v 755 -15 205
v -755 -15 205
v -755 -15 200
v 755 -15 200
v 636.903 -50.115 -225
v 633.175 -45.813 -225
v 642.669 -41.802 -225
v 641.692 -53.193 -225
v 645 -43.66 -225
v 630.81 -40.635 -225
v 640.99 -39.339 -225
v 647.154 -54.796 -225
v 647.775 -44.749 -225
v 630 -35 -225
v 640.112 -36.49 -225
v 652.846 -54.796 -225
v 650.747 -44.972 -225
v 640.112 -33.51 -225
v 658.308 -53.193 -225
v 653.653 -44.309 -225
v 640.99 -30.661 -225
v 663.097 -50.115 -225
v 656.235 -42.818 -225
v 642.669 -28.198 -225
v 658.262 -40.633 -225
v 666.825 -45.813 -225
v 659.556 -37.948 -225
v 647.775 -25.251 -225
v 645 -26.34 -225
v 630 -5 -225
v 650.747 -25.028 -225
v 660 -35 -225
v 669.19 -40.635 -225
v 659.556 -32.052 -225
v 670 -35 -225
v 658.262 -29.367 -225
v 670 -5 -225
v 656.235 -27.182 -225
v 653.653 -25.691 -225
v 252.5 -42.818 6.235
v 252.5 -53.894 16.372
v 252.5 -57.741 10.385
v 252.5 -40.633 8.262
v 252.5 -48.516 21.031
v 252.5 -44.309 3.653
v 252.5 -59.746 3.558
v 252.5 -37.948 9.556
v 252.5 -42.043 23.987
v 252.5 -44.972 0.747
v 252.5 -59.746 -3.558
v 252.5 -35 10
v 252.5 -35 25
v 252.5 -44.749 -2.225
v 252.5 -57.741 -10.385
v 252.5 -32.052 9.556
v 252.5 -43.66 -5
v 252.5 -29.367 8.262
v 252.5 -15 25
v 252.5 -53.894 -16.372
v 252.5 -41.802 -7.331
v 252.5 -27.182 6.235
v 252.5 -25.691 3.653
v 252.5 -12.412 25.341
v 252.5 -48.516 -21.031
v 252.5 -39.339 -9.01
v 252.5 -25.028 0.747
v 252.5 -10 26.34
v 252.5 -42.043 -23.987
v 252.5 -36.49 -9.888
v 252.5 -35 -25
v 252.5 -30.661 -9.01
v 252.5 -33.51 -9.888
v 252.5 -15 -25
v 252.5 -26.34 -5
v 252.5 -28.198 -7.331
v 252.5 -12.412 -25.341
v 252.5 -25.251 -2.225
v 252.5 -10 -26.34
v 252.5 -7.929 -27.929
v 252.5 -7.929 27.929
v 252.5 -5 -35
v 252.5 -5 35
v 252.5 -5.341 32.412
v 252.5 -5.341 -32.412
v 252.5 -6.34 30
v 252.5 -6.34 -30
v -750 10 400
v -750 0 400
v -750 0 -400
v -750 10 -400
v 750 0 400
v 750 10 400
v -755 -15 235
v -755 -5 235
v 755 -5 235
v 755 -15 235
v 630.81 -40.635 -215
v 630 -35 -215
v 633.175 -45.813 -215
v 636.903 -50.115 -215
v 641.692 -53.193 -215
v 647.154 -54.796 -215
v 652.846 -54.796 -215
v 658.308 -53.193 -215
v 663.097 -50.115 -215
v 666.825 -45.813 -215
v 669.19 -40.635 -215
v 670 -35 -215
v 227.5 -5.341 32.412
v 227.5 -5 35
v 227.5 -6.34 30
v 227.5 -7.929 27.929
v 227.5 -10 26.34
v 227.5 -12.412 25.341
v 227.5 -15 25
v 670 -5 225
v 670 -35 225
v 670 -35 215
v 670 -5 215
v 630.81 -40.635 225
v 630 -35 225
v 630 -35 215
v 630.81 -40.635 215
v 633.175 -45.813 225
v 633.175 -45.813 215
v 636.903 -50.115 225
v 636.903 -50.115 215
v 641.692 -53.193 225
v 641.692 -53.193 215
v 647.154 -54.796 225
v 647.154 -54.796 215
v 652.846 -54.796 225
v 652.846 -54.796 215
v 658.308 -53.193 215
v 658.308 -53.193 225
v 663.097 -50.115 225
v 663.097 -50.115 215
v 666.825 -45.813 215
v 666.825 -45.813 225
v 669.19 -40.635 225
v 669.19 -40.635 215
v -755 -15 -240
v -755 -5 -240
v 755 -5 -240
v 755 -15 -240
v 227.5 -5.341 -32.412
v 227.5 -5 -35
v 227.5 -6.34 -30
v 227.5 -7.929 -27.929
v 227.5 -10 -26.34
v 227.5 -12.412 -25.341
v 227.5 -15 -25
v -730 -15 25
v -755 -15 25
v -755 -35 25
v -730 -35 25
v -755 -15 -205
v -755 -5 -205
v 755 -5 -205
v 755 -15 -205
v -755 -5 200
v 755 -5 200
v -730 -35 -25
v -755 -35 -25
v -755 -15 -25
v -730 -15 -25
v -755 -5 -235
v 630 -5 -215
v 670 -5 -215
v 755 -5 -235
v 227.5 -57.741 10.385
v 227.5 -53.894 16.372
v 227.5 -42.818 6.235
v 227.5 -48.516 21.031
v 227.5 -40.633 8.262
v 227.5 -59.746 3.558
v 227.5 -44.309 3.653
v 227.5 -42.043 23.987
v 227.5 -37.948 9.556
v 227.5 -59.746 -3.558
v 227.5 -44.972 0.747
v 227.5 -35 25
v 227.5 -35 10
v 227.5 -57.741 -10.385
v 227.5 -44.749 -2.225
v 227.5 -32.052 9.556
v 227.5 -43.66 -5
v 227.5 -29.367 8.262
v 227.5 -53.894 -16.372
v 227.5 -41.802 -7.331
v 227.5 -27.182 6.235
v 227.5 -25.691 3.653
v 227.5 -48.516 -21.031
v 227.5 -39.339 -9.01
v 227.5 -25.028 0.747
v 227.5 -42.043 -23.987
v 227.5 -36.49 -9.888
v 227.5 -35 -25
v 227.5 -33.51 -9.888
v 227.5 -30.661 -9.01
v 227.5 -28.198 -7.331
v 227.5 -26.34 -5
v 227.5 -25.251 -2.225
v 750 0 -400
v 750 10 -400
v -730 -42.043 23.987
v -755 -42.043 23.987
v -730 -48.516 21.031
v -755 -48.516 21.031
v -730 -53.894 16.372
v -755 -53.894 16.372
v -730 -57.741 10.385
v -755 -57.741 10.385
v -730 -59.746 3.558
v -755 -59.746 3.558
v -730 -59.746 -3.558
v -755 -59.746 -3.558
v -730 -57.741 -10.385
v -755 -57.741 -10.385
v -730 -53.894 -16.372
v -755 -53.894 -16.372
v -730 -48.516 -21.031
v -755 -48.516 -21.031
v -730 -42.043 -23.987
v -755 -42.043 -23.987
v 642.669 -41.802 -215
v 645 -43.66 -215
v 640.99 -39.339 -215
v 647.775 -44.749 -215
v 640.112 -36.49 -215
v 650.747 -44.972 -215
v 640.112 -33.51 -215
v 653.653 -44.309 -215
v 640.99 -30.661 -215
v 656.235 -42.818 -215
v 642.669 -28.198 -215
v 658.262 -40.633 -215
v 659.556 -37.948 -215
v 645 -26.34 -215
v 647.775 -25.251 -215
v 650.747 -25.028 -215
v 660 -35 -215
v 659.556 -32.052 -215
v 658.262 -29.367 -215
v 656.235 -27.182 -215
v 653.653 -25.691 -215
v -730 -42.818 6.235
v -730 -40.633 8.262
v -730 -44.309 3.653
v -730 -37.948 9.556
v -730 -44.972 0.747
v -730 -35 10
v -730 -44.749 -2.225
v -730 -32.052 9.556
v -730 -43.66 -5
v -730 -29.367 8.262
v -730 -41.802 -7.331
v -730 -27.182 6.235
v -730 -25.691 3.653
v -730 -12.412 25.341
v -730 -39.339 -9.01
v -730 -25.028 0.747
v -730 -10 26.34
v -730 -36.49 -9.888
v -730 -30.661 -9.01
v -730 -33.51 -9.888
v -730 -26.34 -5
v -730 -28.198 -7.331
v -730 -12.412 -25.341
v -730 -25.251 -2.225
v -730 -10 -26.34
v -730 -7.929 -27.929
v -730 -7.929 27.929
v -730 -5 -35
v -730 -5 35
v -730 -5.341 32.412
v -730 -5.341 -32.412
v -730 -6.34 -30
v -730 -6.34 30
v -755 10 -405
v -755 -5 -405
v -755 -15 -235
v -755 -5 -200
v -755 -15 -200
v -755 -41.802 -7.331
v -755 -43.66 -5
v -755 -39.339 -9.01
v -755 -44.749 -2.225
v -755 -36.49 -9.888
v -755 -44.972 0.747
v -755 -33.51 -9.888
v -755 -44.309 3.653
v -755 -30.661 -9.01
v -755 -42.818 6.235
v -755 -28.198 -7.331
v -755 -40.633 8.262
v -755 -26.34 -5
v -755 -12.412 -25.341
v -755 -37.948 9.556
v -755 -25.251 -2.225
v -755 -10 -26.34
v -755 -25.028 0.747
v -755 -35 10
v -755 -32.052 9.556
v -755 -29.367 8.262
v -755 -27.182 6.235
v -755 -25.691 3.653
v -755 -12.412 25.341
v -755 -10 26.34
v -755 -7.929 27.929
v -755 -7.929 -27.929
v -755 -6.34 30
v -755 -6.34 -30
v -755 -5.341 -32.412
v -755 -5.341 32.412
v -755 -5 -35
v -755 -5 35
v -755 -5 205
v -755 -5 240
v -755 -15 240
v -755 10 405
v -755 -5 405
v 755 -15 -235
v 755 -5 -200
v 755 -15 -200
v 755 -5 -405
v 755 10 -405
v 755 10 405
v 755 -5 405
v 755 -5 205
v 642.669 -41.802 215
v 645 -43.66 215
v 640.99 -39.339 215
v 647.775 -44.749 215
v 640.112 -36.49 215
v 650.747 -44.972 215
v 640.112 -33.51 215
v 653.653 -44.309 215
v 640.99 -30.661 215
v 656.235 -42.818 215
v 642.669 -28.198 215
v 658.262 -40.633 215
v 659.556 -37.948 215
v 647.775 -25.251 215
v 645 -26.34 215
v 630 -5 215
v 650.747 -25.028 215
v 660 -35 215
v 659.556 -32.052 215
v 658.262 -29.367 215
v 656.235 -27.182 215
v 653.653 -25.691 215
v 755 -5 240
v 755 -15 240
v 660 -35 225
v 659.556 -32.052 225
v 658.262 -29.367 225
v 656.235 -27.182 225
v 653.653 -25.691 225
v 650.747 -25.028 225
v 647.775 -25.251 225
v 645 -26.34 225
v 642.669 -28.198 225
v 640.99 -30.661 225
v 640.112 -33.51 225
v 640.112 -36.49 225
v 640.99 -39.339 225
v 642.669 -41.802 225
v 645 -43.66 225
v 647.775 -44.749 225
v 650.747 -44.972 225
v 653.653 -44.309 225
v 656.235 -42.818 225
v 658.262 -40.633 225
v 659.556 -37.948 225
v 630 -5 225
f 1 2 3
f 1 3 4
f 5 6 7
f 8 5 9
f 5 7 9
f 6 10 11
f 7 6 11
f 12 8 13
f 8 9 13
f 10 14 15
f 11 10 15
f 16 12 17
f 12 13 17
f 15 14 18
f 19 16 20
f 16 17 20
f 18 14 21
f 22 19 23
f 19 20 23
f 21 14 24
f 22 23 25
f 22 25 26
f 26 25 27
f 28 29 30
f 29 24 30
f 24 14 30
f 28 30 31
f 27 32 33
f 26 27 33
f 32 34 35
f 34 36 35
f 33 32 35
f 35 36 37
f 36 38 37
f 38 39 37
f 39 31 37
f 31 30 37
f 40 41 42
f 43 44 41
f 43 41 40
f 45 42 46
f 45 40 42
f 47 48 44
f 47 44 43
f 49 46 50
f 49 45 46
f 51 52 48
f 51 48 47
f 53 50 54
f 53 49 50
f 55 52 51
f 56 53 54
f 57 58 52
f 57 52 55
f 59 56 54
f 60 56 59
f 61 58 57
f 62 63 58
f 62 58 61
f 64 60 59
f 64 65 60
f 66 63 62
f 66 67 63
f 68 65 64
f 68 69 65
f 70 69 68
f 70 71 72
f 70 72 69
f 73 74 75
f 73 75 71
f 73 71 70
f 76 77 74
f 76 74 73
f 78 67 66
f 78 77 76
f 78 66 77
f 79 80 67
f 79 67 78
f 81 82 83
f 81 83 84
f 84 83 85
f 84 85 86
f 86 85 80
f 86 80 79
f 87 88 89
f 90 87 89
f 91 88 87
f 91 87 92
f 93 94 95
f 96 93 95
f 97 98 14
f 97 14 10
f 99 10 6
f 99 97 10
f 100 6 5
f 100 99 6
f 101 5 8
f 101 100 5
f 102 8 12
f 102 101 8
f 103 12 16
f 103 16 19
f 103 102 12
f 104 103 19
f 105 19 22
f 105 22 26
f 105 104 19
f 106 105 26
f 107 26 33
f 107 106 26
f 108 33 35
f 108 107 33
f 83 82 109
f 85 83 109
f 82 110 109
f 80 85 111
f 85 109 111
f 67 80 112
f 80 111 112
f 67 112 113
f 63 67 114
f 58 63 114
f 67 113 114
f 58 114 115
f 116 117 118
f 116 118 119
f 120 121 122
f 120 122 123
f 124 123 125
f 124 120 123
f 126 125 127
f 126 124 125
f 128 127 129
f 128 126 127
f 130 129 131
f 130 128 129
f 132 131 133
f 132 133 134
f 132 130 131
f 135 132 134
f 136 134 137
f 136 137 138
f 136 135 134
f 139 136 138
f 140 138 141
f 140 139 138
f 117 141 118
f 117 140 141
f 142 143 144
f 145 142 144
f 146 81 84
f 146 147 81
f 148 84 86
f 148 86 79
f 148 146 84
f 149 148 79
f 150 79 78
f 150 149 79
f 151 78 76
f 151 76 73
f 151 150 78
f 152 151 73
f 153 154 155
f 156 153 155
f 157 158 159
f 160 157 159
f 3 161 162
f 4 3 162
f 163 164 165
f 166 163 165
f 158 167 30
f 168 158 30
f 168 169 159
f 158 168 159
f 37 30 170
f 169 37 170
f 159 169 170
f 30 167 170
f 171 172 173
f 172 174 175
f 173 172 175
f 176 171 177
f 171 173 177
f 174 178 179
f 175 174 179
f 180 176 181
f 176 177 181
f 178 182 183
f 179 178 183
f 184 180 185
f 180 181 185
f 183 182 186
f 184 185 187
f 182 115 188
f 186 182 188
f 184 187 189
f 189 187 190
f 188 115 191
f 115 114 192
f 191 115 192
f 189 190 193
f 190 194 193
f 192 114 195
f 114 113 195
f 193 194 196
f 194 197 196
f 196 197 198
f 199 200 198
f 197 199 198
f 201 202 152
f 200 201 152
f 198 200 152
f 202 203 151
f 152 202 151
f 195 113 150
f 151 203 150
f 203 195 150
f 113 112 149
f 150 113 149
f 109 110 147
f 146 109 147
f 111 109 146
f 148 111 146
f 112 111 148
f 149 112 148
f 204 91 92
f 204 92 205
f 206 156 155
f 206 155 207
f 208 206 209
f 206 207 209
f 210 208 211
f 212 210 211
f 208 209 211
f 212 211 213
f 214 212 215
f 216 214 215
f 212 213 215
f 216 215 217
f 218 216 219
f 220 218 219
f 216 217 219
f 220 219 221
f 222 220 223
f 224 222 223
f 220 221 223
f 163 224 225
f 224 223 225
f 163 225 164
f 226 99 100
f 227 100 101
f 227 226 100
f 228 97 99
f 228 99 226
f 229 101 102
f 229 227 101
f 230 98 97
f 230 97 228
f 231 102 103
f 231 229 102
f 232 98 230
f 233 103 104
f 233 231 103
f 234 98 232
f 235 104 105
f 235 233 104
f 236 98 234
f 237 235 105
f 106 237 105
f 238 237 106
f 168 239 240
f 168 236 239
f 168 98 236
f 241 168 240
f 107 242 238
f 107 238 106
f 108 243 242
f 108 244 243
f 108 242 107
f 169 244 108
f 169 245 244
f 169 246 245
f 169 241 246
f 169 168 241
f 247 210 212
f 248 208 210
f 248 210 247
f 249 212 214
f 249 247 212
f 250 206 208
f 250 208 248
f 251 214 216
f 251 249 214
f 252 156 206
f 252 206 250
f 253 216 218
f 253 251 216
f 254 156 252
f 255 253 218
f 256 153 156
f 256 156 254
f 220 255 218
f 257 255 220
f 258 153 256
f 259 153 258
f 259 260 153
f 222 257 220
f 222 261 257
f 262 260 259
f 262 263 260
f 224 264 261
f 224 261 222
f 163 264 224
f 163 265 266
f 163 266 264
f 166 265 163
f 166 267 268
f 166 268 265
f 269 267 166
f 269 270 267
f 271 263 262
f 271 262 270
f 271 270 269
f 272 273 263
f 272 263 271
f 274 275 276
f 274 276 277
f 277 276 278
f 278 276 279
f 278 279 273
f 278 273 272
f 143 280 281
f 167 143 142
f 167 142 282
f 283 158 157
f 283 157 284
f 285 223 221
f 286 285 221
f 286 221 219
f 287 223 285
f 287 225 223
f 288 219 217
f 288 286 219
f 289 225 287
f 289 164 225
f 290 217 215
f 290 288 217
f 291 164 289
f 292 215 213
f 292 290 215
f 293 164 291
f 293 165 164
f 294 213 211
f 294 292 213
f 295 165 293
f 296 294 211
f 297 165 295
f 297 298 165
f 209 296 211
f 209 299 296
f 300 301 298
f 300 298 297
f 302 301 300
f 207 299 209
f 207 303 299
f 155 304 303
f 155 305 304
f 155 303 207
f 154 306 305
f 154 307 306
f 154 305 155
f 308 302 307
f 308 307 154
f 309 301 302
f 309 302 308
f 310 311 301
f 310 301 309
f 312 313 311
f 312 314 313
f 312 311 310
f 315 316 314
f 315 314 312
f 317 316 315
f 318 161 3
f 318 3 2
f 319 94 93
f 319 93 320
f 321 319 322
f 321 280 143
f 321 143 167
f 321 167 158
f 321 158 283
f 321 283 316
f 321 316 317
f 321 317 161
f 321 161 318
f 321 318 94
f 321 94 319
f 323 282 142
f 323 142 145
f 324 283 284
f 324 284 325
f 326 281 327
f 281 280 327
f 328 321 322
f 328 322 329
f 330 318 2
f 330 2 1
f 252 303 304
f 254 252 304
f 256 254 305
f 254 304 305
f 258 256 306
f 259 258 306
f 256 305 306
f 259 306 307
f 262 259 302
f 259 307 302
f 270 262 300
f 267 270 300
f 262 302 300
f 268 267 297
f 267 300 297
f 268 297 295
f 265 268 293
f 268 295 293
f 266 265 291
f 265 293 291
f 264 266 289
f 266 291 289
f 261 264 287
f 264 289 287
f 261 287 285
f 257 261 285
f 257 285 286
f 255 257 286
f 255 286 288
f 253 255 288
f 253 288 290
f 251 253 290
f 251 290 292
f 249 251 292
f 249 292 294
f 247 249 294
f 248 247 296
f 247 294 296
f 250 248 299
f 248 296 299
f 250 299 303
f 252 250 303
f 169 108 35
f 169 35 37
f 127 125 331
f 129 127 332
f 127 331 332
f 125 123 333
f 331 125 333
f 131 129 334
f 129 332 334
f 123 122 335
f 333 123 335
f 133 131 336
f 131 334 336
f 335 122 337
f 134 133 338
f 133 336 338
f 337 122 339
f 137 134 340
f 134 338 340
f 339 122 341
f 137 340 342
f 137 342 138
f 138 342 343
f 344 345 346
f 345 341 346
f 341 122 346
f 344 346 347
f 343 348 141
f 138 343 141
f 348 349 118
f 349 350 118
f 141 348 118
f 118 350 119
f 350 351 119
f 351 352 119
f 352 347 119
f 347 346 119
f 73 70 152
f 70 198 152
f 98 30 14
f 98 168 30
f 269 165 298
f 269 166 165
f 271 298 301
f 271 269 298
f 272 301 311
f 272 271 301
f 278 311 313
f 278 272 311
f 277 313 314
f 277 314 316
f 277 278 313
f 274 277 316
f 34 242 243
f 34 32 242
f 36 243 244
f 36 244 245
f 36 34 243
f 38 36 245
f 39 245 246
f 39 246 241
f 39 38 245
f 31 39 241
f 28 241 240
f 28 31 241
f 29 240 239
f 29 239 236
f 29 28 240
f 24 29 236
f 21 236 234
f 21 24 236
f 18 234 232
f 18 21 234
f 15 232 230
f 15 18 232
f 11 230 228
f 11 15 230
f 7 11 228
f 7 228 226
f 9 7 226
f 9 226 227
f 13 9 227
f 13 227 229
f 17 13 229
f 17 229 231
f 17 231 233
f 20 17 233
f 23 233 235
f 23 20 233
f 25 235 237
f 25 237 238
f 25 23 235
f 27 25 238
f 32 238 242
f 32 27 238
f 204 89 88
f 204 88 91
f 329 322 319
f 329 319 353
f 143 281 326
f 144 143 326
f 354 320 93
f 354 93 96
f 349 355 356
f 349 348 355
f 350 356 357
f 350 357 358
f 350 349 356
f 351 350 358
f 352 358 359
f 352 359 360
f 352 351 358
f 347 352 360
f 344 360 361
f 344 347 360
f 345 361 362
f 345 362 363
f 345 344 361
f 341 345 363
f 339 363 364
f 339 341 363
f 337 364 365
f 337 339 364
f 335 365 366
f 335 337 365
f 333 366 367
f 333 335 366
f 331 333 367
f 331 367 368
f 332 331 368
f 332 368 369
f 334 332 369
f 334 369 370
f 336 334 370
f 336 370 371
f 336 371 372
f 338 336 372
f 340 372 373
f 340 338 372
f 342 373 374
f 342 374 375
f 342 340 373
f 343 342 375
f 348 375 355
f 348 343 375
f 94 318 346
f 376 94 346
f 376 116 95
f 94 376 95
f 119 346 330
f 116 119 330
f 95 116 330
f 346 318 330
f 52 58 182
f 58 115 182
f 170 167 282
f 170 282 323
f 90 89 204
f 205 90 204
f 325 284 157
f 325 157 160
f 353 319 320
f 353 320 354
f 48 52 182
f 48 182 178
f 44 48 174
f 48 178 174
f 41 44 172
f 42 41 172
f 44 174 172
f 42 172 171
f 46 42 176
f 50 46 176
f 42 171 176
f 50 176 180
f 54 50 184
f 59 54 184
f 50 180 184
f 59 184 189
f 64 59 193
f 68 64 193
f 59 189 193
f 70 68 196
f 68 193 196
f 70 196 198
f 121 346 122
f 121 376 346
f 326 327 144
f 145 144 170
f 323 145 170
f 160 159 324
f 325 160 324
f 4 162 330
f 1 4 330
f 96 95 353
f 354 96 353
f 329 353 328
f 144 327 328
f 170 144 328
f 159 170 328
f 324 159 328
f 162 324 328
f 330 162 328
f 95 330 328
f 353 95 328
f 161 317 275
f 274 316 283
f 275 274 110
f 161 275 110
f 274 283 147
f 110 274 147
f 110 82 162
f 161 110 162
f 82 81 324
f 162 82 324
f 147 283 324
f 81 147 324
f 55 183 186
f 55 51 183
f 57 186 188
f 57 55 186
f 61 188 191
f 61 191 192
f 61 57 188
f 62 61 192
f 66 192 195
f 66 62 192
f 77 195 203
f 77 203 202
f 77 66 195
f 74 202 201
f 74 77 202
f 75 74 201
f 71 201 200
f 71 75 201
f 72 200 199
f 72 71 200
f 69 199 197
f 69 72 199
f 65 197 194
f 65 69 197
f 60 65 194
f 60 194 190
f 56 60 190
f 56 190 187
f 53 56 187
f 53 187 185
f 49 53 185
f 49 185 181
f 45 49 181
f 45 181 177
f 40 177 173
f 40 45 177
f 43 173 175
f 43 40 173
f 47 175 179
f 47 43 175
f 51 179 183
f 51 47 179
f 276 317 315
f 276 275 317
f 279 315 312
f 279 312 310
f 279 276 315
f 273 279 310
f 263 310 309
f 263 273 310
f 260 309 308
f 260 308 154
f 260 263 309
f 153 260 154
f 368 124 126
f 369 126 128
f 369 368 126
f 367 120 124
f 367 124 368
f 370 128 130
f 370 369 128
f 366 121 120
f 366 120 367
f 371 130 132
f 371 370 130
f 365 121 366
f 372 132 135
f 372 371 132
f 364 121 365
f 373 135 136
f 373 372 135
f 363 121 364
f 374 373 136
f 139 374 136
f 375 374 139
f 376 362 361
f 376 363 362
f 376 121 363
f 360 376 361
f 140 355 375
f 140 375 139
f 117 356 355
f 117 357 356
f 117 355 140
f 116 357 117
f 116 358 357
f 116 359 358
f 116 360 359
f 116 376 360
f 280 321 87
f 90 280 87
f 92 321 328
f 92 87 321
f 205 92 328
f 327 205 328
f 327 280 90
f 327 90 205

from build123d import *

# Parameters (mm, degrees)
SKETCH2_W                 = 1510
SKETCH2_H                 = 810
SKETCH2_W_2               = 1500
SKETCH2_H_2               = 800
BOSS_EXTRUDE1_DEPTH       = 10
SKETCH3_W                 = 1510
SKETCH3_H                 = 810
SKETCH3_W_2               = 1460
SKETCH3_H_2               = 140
SKETCH3_W_3               = 30
SKETCH3_H_3               = 400
SKETCH3_W_4               = 1200
BOSS_EXTRUDE2_DEPTH       = 5
SKETCH5_W                 = 1510
SKETCH5_H                 = 5
BOSS_EXTRUDE3_DEPTH       = 10
LPATTERN1_COUNT           = 2
LPATTERN1_PITCH           = 35
LPATTERN2_COUNT           = 2
LPATTERN2_PITCH           = 440
LPATTERN2_COPY_1_SKETCH_W = 1510
LPATTERN2_COPY_1_SKETCH_H = 5
LPATTERN2_COPY_1_DEPTH    = 10
SKETCH6_R                 = 10
BOSS_EXTRUDE4_DEPTH       = 5
LPATTERN3_COUNT           = 2
LPATTERN3_PITCH           = 440
SKETCH8_R                 = 10
BOSS_EXTRUDE5_DEPTH       = 25
SKETCH9_W                 = 80
SKETCH9_H                 = 400
BOSS_EXTRUDE6_DEPTH       = 5
SKETCH10_R                = 10
BOSS_EXTRUDE7_DEPTH       = 12.5
SKETCH12_W                = 400
SKETCH12_H                = 5
BOSS_EXTRUDE8_DEPTH       = 100
FILLET3_R                 = 10
FILLET4_R                 = 10
FILLET5_R                 = 10
FILLET6_R                 = 10
SKETCH13_W                = 1460
SKETCH13_H                = 140
SKETCH13_W_2              = 800
SKETCH13_H_2              = 400
SKETCH13_W_3              = 30
SKETCH13_W_4              = 220
BOSS_EXTRUDE9_DEPTH       = 5


with BuildPart() as part:
    # Sketch2 → Boss-Extrude1 (new body)
    with BuildSketch(Plane(origin=(0, 0, 0), x_dir=(1, 0, 0), z_dir=(0, 1, 0))):
        Rectangle(SKETCH2_W, SKETCH2_H)
        Rectangle(SKETCH2_W_2, SKETCH2_H_2, mode=Mode.SUBTRACT)
    extrude(amount=BOSS_EXTRUDE1_DEPTH)

    # Sketch3 → Boss-Extrude2 (add)
    with BuildSketch(Plane(origin=(0, 0, 0), x_dir=(1, 0, 0), z_dir=(0, 1, 0))):
        Rectangle(SKETCH3_W, SKETCH3_H)
        with Locations((0, -310)):
            Rectangle(SKETCH3_W_2, SKETCH3_H_2, mode=Mode.SUBTRACT)
        with Locations((0, 310)):
            Rectangle(SKETCH3_W_2, SKETCH3_H_2, mode=Mode.SUBTRACT)
        with Locations((-715, 0)):
            Rectangle(SKETCH3_W_3, SKETCH3_H_3, mode=Mode.SUBTRACT)
        with Locations((715, 0)):
            Rectangle(SKETCH3_W_3, SKETCH3_H_3, mode=Mode.SUBTRACT)
        Rectangle(SKETCH3_W_4, SKETCH3_H_3, mode=Mode.SUBTRACT)
    extrude(amount=-BOSS_EXTRUDE2_DEPTH)

    # Sketch5 → Boss-Extrude3 (add)
    with BuildSketch(Plane.XZ.offset(5)):
        with Locations((0, 237.5)):
            Rectangle(SKETCH5_W, SKETCH5_H)
    boss_extrude3 = extrude(amount=BOSS_EXTRUDE3_DEPTH)

    # LPattern1: Boss-Extrude3 ×2
    with Locations(*[(0, 0, -i * LPATTERN1_PITCH) for i in range(1, LPATTERN1_COUNT)]):
        add(boss_extrude3)

    # LPattern2: Boss-Extrude3 ×2
    with Locations(*[(0, 0, -i * LPATTERN2_PITCH) for i in range(1, LPATTERN2_COUNT)]):
        add(boss_extrude3)

    # LPattern2 copy 1 sketch → LPattern2 copy 1 (add)
    with BuildSketch(Plane(origin=(0, -5, -475), x_dir=(1, 0, 0), z_dir=(0, -1, 0))):
        with Locations((0, 237.5)):
            Rectangle(LPATTERN2_COPY_1_SKETCH_W, LPATTERN2_COPY_1_SKETCH_H)
    extrude(amount=LPATTERN2_COPY_1_DEPTH)

    # Sketch6 → Boss-Extrude4 (add, symmetric)
    with BuildSketch(Plane.XY.offset(220)):
        with BuildLine():
            Line((630, -5), (630, -35))
            ThreePointArc((630, -35), (650, -55), (670, -35))
            Line((670, -35), (670, -5))
            Line((670, -5), (630, -5))
        make_face()
        with Locations((650, -35)):
            Circle(SKETCH6_R, mode=Mode.SUBTRACT)
    boss_extrude4 = extrude(amount=BOSS_EXTRUDE4_DEPTH, both=True)

    # LPattern3: Boss-Extrude4 ×2
    with Locations(*[(0, 0, -i * LPATTERN3_PITCH) for i in range(1, LPATTERN3_COUNT)]):
        add(boss_extrude4)

    # Sketch8 → Boss-Extrude5 (add)
    with BuildSketch(Plane.ZY.offset(755)):
        with BuildLine():
            Line((-25, -35), (-25, -5))
            Line((-25, -5), (25, -5))
            Line((25, -5), (25, -35))
            ThreePointArc((25, -35), (0, -60), (-25, -35))
        make_face()
        with Locations((0, -35)):
            Circle(SKETCH8_R, mode=Mode.SUBTRACT)
    extrude(amount=-BOSS_EXTRUDE5_DEPTH)

    # Sketch9 → Boss-Extrude6 (add)
    with BuildSketch(Plane(origin=(0, 0, 0), x_dir=(1, 0, 0), z_dir=(0, 1, 0))):
        with Locations((240, 0)):
            Rectangle(SKETCH9_W, SKETCH9_H)
    extrude(amount=-BOSS_EXTRUDE6_DEPTH)

    # Sketch10 → Boss-Extrude7 (add, symmetric)
    with BuildSketch(Plane.ZY.offset(-240)):
        with BuildLine():
            Line((25, -5), (25, -35))
            ThreePointArc((25, -35), (0, -60), (-25, -35))
            Line((-25, -35), (-25, -5))
            Line((-25, -5), (25, -5))
        make_face()
        with Locations((0, -35)):
            Circle(SKETCH10_R, mode=Mode.SUBTRACT)
    extrude(amount=BOSS_EXTRUDE7_DEPTH, both=True)

    # Sketch12 → Boss-Extrude8 (add)
    with BuildSketch(Plane(origin=(280, 0, 0), x_dir=(0, 0, -1), z_dir=(1, 0, 0))):
        with Locations((0, -2.5)):
            Rectangle(SKETCH12_W, SKETCH12_H)
    extrude(amount=BOSS_EXTRUDE8_DEPTH)

    # Fillet3
    fillet3_edges = [part.edges().sort_by_distance(p)[0] for p in [
        (240, -5, 25),
    ]]
    fillet(fillet3_edges, radius=FILLET3_R)

    # Fillet4
    fillet4_edges = [part.edges().sort_by_distance(p)[0] for p in [
        (240, -5, -25),
    ]]
    fillet(fillet4_edges, radius=FILLET4_R)

    # Fillet5
    fillet5_edges = [part.edges().sort_by_distance(p)[0] for p in [
        (-742.5, -5, 25),
    ]]
    fillet(fillet5_edges, radius=FILLET5_R)

    # Fillet6
    fillet6_edges = [part.edges().sort_by_distance(p)[0] for p in [
        (-742.5, -5, -25),
    ]]
    fillet(fillet6_edges, radius=FILLET6_R)

    # Sketch13 → Boss-Extrude9 (add)
    with BuildSketch(Plane.XZ.offset(5)):
        with Locations((0, 310)):
            Rectangle(SKETCH13_W, SKETCH13_H)
        with Locations((0, -310)):
            Rectangle(SKETCH13_W, SKETCH13_H)
        with Locations((-200, 0)):
            Rectangle(SKETCH13_W_2, SKETCH13_H_2)
        with Locations((-715, 0)):
            Rectangle(SKETCH13_W_3, SKETCH13_H_2)
        with Locations((490, 0)):
            Rectangle(SKETCH13_W_4, SKETCH13_H_2)
        with Locations((715, 0)):
            Rectangle(SKETCH13_W_3, SKETCH13_H_2)
    extrude(amount=-BOSS_EXTRUDE9_DEPTH)


solid = part.part
